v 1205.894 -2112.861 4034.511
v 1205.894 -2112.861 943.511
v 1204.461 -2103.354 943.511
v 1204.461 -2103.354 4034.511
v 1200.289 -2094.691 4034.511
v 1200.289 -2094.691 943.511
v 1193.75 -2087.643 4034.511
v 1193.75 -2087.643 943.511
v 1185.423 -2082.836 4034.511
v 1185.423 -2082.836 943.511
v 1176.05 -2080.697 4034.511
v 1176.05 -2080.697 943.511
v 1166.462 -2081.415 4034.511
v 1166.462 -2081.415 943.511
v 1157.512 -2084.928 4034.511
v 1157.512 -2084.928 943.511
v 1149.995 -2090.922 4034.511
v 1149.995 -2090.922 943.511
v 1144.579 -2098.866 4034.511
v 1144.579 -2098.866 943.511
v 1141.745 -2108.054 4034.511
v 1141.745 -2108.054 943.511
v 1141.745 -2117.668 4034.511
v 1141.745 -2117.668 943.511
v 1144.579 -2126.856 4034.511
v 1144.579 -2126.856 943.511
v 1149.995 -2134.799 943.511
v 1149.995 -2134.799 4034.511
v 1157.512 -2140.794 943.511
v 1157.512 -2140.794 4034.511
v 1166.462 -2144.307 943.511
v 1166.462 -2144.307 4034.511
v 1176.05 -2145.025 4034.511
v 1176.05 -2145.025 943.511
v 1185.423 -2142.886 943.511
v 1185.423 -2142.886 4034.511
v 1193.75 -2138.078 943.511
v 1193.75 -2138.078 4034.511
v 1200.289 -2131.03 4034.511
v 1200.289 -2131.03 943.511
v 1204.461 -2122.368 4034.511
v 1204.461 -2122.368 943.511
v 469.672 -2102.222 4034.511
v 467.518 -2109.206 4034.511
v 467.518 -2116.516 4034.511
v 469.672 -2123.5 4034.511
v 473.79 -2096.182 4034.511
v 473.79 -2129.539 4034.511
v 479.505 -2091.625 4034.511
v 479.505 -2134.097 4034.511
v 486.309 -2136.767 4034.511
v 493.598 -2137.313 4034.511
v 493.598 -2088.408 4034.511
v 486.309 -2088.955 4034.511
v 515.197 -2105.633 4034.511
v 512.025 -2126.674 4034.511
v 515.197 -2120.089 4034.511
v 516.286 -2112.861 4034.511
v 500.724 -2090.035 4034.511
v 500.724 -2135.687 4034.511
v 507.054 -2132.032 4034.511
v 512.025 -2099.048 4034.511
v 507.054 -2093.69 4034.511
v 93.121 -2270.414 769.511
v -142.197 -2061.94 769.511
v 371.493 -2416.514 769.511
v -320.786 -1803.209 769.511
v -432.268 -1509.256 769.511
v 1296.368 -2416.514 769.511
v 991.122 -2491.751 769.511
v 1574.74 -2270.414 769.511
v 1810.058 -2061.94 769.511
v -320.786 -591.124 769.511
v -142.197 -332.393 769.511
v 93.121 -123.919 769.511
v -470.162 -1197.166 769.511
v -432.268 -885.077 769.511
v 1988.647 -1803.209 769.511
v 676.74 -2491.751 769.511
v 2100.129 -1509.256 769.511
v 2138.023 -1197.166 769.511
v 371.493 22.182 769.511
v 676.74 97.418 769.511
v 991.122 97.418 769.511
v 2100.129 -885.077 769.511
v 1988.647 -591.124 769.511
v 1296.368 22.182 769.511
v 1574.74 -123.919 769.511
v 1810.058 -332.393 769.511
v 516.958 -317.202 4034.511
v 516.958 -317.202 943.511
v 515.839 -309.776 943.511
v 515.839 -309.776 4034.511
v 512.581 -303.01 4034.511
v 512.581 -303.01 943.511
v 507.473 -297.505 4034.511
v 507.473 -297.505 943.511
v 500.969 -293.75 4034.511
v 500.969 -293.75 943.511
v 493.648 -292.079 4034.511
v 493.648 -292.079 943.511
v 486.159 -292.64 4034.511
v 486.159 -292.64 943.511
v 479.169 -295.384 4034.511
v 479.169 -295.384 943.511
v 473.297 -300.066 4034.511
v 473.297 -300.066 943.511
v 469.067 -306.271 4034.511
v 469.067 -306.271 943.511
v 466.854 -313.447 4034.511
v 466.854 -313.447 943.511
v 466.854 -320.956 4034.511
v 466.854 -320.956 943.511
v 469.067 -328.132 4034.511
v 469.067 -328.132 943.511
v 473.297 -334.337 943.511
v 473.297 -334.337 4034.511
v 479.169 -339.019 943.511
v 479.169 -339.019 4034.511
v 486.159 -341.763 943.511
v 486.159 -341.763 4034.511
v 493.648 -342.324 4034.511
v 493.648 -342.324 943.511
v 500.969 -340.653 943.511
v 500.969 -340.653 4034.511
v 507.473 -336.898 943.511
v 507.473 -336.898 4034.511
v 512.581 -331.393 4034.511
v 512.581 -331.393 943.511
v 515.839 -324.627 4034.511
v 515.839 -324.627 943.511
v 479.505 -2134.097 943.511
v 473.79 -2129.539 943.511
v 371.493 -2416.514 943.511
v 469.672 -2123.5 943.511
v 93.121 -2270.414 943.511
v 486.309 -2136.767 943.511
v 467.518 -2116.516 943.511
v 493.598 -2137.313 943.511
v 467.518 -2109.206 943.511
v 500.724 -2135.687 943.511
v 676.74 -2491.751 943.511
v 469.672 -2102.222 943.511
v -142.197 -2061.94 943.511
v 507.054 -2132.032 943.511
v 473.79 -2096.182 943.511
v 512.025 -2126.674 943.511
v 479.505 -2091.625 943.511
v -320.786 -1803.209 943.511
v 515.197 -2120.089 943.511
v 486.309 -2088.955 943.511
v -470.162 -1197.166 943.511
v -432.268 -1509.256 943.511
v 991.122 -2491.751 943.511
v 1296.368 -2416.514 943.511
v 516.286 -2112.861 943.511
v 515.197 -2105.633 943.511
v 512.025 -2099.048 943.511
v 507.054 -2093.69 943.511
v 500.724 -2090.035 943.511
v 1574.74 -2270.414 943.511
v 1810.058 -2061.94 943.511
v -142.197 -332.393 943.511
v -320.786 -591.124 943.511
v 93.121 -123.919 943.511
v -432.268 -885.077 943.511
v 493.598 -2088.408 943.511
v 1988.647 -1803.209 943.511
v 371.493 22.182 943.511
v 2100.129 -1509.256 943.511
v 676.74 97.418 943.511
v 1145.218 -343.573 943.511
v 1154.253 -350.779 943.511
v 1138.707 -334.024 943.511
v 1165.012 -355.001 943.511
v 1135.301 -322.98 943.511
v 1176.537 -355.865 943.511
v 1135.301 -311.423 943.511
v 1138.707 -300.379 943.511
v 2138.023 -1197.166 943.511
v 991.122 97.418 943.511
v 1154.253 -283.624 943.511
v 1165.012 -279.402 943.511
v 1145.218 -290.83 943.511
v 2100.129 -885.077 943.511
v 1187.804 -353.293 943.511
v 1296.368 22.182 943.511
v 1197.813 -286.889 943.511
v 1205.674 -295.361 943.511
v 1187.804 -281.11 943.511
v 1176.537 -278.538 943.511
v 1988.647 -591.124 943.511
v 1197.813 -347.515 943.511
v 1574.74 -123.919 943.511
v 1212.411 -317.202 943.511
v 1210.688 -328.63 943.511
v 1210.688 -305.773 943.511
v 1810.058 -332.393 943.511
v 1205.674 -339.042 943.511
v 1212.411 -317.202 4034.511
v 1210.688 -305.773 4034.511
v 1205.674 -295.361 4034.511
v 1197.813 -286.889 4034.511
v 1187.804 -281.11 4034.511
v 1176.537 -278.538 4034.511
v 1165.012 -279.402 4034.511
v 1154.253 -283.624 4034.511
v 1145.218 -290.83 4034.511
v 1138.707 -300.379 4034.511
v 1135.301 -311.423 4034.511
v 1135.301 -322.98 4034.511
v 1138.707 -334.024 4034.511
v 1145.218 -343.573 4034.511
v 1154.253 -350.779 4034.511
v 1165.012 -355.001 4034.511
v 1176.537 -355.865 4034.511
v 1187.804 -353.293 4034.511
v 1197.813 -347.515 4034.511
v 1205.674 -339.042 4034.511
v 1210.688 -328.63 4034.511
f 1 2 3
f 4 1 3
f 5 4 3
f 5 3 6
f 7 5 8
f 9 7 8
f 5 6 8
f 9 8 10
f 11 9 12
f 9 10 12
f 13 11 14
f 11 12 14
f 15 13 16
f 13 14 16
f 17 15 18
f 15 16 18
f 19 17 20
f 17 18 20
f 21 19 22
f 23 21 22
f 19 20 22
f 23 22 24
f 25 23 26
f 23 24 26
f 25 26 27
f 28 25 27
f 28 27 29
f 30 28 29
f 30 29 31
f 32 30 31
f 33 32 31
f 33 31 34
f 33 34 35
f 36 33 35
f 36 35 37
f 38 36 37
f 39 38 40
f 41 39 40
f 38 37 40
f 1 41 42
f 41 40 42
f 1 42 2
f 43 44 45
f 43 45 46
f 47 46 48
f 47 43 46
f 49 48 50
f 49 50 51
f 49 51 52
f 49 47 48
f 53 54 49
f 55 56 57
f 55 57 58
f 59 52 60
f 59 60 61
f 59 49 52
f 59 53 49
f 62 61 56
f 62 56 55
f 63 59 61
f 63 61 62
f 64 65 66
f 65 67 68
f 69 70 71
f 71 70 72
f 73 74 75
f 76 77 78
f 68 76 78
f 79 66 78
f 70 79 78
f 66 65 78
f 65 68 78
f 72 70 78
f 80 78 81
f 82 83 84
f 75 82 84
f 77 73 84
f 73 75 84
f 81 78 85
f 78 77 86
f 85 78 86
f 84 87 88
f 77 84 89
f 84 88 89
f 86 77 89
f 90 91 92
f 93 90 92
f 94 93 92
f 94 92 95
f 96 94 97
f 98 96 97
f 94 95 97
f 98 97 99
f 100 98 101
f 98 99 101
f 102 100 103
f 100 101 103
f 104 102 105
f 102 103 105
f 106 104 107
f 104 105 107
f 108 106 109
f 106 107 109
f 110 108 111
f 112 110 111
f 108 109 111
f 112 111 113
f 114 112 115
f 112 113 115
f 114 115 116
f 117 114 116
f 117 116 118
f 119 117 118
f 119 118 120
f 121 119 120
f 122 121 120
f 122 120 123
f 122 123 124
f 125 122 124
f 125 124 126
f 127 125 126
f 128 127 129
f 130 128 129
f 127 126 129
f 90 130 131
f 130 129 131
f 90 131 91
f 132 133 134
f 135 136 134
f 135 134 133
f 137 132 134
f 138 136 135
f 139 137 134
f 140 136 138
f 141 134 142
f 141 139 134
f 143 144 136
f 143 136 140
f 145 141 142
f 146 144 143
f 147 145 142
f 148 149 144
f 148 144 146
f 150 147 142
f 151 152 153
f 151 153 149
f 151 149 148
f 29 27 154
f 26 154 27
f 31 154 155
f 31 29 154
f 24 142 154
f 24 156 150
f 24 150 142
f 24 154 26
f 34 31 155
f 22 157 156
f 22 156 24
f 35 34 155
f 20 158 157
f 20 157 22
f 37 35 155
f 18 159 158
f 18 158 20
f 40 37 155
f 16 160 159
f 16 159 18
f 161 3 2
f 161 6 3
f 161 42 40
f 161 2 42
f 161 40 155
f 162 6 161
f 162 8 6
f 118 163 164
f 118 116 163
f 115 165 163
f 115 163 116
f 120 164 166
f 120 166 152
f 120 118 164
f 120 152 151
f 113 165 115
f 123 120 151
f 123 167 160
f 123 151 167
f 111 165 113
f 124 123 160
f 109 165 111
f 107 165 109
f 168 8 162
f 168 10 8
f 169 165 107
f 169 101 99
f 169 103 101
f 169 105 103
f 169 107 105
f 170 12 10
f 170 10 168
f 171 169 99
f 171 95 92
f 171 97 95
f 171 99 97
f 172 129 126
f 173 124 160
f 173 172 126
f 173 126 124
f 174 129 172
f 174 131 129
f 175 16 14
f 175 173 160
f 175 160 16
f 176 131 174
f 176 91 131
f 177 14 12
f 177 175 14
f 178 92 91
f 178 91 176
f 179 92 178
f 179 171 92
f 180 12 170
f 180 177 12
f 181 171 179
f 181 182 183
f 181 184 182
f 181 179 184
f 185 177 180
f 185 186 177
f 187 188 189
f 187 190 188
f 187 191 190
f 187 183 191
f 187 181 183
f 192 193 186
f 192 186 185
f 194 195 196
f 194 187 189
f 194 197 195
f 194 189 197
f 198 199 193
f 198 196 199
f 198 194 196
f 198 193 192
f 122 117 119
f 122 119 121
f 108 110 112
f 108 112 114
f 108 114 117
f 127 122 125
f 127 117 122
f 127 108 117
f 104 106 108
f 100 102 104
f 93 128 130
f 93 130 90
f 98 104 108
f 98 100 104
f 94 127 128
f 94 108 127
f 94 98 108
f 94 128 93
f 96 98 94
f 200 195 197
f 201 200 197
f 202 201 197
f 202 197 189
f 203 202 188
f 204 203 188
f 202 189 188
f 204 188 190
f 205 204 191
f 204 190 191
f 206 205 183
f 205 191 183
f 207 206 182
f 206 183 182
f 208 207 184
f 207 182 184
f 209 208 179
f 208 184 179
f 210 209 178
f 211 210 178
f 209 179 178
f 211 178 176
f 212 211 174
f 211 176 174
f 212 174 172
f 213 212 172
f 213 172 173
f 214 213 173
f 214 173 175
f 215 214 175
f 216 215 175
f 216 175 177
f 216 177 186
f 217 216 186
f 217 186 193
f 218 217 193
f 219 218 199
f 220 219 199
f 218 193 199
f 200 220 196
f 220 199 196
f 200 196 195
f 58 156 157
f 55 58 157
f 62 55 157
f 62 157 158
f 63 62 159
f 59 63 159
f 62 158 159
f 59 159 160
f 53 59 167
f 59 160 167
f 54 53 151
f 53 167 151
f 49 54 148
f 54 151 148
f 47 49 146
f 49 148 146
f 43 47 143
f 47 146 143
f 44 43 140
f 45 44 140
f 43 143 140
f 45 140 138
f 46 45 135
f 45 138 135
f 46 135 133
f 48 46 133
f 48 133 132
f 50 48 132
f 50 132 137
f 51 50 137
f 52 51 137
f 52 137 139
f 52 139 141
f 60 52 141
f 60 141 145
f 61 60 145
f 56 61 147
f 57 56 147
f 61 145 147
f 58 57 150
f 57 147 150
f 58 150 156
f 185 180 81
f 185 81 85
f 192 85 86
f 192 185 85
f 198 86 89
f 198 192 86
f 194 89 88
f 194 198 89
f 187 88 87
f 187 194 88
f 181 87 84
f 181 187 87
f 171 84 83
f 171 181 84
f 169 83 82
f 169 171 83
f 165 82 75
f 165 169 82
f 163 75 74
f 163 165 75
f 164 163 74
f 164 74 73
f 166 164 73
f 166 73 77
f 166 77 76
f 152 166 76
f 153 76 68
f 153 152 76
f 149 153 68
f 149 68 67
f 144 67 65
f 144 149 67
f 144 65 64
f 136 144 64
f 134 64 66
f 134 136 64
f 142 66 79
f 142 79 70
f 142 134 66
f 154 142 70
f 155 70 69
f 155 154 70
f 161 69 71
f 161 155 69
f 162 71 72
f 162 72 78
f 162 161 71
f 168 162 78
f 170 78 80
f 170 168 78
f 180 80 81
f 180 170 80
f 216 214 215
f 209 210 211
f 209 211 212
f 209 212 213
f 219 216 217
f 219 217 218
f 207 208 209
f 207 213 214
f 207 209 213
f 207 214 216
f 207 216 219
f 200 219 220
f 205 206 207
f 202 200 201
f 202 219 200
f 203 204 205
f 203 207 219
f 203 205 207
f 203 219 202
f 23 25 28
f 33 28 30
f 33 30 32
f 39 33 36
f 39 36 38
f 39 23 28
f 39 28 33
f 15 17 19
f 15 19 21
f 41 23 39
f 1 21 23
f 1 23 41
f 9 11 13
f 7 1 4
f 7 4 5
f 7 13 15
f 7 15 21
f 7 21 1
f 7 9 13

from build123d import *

# Parameters (mm, degrees)
SKETCH1_R           = 1304.092779863
BOSS_EXTRUDE1_DEPTH = 174
SKETCH3_R           = 38.771715285
SKETCH3_R_2         = 25.192981172
SKETCH3_R_3         = 24.521075722
SKETCH3_R_4         = 32.254492843
BOSS_EXTRUDE2_DEPTH = 3091


with BuildPart() as part:
    # Sketch1 → Boss-Extrude1 (new body)
    with BuildSketch(Plane.XY.offset(943.510776168)):
        with Locations((833.930631376, -1197.16637306)):
            Circle(SKETCH1_R)
    extrude(amount=-BOSS_EXTRUDE1_DEPTH)

    # Sketch3 → Boss-Extrude2 (add)
    with BuildSketch(Plane.XY.offset(943.510776168)):
        with Locations((1173.639225527, -317.201613393)):
            Circle(SKETCH3_R)
        with Locations((491.765116758, -317.201613393)):
            Circle(SKETCH3_R_2)
        with Locations((491.765116758, -2112.860849235)):
            Circle(SKETCH3_R_3)
        with Locations((1173.639225527, -2112.860849235)):
            Circle(SKETCH3_R_4)
    extrude(amount=BOSS_EXTRUDE2_DEPTH)


solid = part.part
